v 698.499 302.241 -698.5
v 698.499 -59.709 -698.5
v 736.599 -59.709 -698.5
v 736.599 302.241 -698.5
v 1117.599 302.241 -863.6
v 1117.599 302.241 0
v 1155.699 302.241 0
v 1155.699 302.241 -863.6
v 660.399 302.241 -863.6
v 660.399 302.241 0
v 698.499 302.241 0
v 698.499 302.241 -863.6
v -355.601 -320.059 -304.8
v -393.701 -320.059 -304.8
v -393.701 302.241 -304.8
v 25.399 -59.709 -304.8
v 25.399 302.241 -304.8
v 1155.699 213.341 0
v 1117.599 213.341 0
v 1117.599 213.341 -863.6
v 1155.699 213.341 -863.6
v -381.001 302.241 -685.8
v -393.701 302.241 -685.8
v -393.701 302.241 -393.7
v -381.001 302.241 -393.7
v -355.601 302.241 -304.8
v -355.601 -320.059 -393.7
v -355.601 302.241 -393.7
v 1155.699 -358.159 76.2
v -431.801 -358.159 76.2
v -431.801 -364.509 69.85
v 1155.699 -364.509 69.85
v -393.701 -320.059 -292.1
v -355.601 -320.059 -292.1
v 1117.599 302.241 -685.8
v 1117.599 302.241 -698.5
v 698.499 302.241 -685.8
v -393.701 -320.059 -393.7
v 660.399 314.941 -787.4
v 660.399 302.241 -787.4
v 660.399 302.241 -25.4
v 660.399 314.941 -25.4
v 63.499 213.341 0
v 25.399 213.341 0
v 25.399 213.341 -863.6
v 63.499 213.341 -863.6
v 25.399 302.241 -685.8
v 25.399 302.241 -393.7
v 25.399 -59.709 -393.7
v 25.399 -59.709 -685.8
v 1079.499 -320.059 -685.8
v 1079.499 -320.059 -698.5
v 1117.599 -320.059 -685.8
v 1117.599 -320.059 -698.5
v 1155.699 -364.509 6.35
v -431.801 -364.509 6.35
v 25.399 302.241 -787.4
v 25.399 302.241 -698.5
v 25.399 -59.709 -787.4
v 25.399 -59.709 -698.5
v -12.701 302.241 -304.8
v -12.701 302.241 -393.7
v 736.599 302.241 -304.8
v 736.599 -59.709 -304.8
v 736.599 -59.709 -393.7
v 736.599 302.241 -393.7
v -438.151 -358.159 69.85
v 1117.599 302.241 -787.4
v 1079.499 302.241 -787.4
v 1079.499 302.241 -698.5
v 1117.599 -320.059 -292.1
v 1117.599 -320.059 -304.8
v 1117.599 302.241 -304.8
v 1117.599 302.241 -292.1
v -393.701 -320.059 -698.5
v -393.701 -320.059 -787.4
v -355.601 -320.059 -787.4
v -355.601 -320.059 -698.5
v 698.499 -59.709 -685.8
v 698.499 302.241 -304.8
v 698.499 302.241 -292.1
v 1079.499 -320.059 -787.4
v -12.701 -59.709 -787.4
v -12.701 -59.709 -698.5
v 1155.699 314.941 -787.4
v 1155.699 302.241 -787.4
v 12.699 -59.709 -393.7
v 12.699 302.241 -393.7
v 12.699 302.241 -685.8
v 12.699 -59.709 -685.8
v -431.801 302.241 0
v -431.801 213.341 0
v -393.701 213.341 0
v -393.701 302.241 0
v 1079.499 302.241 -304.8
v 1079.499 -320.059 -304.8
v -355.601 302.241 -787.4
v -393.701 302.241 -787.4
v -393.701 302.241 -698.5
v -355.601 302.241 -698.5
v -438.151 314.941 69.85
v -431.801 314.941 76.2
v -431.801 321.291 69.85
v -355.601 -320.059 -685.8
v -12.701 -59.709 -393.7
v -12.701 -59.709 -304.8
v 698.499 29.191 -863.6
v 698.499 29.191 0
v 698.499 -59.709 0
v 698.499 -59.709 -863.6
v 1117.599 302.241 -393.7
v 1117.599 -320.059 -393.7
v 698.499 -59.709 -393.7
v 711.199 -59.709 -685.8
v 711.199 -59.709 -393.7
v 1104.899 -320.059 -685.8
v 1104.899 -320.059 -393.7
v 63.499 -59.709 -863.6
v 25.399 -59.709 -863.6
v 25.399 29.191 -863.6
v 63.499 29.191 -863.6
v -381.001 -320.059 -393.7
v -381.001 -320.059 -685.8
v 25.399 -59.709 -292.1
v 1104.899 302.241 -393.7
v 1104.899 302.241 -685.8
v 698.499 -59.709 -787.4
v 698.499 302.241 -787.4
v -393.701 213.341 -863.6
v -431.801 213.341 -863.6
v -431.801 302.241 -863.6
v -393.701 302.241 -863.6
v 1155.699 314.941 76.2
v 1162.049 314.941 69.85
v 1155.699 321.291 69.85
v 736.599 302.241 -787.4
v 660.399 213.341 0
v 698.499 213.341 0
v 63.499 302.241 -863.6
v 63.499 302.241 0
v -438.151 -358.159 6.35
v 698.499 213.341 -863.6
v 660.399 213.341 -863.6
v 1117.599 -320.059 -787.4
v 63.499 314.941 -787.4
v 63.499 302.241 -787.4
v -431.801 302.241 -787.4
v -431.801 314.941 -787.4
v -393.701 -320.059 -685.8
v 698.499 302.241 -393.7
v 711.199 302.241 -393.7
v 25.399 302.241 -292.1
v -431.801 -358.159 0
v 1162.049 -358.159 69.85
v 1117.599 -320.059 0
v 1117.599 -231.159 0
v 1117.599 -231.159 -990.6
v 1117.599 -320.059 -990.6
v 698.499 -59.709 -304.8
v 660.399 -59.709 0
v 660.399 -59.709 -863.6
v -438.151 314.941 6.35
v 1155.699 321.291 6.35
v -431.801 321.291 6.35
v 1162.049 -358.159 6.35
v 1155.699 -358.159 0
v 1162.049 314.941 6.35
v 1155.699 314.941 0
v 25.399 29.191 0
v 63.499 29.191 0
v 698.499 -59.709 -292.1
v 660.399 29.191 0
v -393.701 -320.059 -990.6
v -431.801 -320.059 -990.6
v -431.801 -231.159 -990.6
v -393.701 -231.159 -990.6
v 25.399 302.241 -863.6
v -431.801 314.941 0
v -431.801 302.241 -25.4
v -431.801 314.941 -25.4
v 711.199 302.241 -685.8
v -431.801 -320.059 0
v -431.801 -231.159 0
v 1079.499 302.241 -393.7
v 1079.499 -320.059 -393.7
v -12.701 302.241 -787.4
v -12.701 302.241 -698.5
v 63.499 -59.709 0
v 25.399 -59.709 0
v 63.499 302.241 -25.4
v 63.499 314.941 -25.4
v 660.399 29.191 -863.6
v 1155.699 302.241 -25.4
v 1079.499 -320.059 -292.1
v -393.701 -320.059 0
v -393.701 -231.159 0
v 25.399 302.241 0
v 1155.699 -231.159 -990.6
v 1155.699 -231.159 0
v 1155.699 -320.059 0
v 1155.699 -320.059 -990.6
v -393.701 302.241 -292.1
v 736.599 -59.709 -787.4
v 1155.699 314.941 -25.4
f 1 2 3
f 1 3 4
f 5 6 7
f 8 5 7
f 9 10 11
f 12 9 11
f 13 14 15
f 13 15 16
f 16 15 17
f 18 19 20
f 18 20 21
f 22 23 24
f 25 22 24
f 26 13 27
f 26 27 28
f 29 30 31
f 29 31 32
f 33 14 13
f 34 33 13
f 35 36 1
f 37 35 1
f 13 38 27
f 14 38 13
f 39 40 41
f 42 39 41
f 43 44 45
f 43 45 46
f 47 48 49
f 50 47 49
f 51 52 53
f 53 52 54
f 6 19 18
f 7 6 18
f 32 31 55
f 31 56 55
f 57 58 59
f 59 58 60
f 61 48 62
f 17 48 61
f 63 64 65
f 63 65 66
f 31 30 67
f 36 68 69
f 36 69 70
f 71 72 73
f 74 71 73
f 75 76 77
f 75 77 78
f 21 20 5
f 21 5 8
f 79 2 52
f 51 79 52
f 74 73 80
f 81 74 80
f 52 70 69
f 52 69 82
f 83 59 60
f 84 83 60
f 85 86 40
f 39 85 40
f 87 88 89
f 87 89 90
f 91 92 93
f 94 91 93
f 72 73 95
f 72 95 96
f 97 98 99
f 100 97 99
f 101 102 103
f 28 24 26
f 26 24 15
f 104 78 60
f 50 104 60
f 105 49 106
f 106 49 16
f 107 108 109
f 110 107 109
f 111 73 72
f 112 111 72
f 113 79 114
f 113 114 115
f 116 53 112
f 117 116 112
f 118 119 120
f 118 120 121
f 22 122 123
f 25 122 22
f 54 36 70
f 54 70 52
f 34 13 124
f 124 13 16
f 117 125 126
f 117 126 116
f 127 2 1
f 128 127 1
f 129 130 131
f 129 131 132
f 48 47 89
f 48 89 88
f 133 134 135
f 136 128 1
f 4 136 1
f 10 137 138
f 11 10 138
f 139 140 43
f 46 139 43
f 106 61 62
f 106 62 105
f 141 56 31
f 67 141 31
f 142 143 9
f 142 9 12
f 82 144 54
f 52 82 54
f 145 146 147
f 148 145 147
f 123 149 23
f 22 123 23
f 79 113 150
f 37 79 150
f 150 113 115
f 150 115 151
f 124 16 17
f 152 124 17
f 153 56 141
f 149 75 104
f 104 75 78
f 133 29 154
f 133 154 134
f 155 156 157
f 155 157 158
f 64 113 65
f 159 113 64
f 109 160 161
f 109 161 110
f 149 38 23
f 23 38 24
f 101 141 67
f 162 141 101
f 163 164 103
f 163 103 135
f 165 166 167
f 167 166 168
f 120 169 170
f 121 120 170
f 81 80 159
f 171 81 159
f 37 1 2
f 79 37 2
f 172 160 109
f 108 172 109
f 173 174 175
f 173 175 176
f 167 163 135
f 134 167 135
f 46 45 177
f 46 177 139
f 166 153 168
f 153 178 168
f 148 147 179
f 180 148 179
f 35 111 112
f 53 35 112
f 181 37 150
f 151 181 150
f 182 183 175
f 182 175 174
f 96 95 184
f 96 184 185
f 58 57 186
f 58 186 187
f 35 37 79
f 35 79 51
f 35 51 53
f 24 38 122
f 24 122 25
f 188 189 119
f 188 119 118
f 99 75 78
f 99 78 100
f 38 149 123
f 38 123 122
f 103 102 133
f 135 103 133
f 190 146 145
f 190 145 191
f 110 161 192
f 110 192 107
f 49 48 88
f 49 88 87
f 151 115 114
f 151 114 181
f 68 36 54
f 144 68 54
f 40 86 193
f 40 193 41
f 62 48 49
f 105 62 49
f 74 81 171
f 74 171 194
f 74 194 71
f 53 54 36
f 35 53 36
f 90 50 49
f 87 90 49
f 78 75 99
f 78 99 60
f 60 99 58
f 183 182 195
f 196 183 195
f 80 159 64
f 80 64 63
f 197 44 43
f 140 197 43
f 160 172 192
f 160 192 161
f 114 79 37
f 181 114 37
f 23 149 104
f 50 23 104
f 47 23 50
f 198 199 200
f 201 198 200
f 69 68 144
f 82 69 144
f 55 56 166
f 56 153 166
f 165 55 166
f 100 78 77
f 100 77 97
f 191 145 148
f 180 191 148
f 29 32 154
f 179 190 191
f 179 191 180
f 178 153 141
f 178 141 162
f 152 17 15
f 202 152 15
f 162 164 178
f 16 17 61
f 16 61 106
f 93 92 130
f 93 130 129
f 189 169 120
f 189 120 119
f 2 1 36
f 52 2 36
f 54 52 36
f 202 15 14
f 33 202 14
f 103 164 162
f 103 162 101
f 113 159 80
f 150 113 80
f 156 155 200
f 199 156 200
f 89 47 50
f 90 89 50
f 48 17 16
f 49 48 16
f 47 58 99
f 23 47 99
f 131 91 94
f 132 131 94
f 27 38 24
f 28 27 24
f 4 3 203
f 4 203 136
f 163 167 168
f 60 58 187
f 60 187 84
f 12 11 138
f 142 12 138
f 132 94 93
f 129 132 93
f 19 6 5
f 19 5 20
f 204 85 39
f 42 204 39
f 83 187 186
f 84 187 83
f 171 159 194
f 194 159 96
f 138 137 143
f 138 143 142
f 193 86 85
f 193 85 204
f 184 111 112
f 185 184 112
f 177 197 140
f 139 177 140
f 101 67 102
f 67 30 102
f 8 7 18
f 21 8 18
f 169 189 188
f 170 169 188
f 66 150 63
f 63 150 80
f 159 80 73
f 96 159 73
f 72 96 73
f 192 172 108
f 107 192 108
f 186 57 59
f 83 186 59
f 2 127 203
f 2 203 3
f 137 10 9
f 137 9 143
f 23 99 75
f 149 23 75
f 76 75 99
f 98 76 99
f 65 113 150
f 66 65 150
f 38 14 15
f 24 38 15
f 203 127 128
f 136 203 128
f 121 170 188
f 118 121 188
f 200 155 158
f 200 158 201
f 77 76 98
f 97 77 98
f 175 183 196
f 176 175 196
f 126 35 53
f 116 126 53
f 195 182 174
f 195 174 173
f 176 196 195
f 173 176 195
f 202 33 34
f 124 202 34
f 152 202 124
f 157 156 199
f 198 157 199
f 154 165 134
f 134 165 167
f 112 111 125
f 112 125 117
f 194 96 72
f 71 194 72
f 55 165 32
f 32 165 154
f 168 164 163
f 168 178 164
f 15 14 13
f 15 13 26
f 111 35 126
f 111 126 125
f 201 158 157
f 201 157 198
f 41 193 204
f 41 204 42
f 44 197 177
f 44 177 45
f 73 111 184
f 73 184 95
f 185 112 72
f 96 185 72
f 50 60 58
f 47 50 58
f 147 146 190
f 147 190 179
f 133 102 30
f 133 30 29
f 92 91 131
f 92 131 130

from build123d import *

# Parameters (mm, degrees)
F0_W      = 1600.2
F0_H      = 685.8
F1_DEPTH  = 76.2
F2_SIZE   = 6.35
F3_W      = 38.1
F3_H      = 88.9
F4_DEPTH  = 990.6
F4_FACE_W = 38.1
F4_FACE_H = 88.9
F5_DEPTH  = 127
F6_W      = 622.3
F6_H      = 88.9
F7_DEPTH  = 38.1
F8_W      = 361.95
F8_H      = 88.9
F9_DEPTH  = 38.1
F10_W     = 361.95
F10_H     = 88.9
F11_DEPTH = 38.1
F12_W     = 622.3
F12_H     = 88.9
F13_DEPTH = 38.1
F15_DEPTH = 12.7
F17_DEPTH = 12.7
F19_DEPTH = 12.7
F21_DEPTH = 12.7
F22_W     = 495.3
F22_H     = 762
F23_DEPTH = 12.7
F24_W     = 495.3
F24_H     = 762
F25_DEPTH = 12.7
F26_W     = 622.3
F26_H     = 292.1
F27_DEPTH = 12.7
F28_W     = 361.95
F28_H     = 292.1
F29_DEPTH = 12.7
F30_W     = 361.95
F30_H     = 292.1
F31_DEPTH = 12.7
F32_W     = 622.3
F32_H     = 292.1
F33_DEPTH = 12.7


with BuildPart() as f1:
    # F0 (on Top) → F1 (new body)
    with BuildSketch(Plane.XY):
        with Locations((361.94872, -21.608793)):
            Rectangle(F0_W, F0_H)
    extrude(amount=F1_DEPTH)

    # F2
    f2_edges = [f1.edges().sort_by_distance(p)[0] for p in [
        (-438.15128, -21.608793, 76.2),
        (361.94872, -364.508793, 76.2),
        (361.94872, -364.508793, 0),
        (-438.15128, -364.508793, 38.1),
        (1162.04872, -364.508793, 38.1),
        (1162.04872, -21.608793, 76.2),
        (1162.04872, -21.608793, 0),
        (1162.04872, 321.291207, 38.1),
        (361.94872, 321.291207, 76.2),
        (361.94872, 321.291207, 0),
        (-438.15128, 321.291207, 38.1),
        (-438.15128, -21.608793, 0),
    ]]
    chamfer(f2_edges, length=F2_SIZE)


with BuildPart() as f4:
    # F3 (on face) → F4 (new body)
    with BuildSketch(Plane(origin=(0, 0, 0), x_dir=(1, 0, 0), z_dir=(0, 0, -1))):
        with Locations((-412.75128, -257.791207)):
            Rectangle(F3_W, F3_H)
        with Locations((-412.75128, 275.608793)):
            Rectangle(F3_W, F3_H)
        with Locations((44.44872, 15.258793)):
            Rectangle(F3_W, F3_H)
        with Locations((44.44872, -257.791207)):
            Rectangle(F3_W, F3_H)
        with Locations((679.44872, -257.791207)):
            Rectangle(F3_W, F3_H)
        with Locations((679.44872, 15.258793)):
            Rectangle(F3_W, F3_H)
        with Locations((1136.64872, 275.608793)):
            Rectangle(F3_W, F3_H)
        with Locations((1136.64872, -257.791207)):
            Rectangle(F3_W, F3_H)
    extrude(amount=F4_DEPTH)

    # F4_face (on face) → F5 (cut)
    with BuildSketch(Plane(origin=(-412.75128, 257.791207, -990.6), x_dir=(1, 0, 0), z_dir=(0, 0, -1))):
        Rectangle(F4_FACE_W, F4_FACE_H)
        with Locations((457.2, 0)):
            Rectangle(F4_FACE_W, F4_FACE_H)
        with Locations((457.2, 273.05)):
            Rectangle(F4_FACE_W, F4_FACE_H)
        with Locations((1092.2, 273.05)):
            Rectangle(F4_FACE_W, F4_FACE_H)
        with Locations((1092.2, 0)):
            Rectangle(F4_FACE_W, F4_FACE_H)
        with Locations((1549.4, 0)):
            Rectangle(F4_FACE_W, F4_FACE_H)
    extrude(amount=-F5_DEPTH, mode=Mode.SUBTRACT)


with BuildPart() as f7:
    # F6 (on face) → F7 (new body)
    with BuildSketch(Plane.YZ.offset(-393.70128)):
        with Locations((-8.908793, -349.25)):
            Rectangle(F6_W, F6_H)
        with Locations((-8.908793, -742.95)):
            Rectangle(F6_W, F6_H)
    extrude(amount=F7_DEPTH)


with BuildPart() as f9:
    # F8 (on face) → F9 (new body)
    with BuildSketch(Plane(origin=(25.39872, 0, 0), x_dir=(0, -1, 0), z_dir=(-1, 0, 0))):
        with Locations((-121.266207, -349.25)):
            Rectangle(F8_W, F8_H)
        with Locations((-121.266207, -742.95)):
            Rectangle(F8_W, F8_H)
    extrude(amount=F9_DEPTH)


with BuildPart() as f11:
    # F10 (on face) → F11 (new body)
    with BuildSketch(Plane.YZ.offset(698.49872)):
        with Locations((121.266207, -349.25)):
            Rectangle(F10_W, F10_H)
        with Locations((121.266207, -742.95)):
            Rectangle(F10_W, F10_H)
    extrude(amount=F11_DEPTH)


with BuildPart() as f13:
    # F12 (on face) → F13 (new body)
    with BuildSketch(Plane(origin=(1117.59872, 0, 0), x_dir=(0, -1, 0), z_dir=(-1, 0, 0))):
        with Locations((8.908793, -742.95)):
            Rectangle(F12_W, F12_H)
        with Locations((8.908793, -349.25)):
            Rectangle(F12_W, F12_H)
    extrude(amount=F13_DEPTH)


with BuildPart() as f15:
    # F14 (on face) → F15 (new body)
    with BuildSketch(Plane.XY.offset(-304.8)):
        Polygon((25.39872, -59.708793), (25.39872, 302.241207), (-393.70128, 302.241207), (-393.70128, -320.058793), (-355.60128, -320.058793), align=None)
    extrude(amount=F15_DEPTH)


with BuildPart() as f17:
    # F16 (on face) → F17 (new body)
    with BuildSketch(Plane.XY.offset(-698.5)):
        Polygon((25.39872, -59.708793), (25.39872, 302.241207), (-393.70128, 302.241207), (-393.70128, -320.058793), (-355.60128, -320.058793), align=None)
    extrude(amount=F17_DEPTH)


with BuildPart() as f19:
    # F18 (on face) → F19 (new body)
    with BuildSketch(Plane.XY.offset(-304.8)):
        Polygon((1117.59872, 302.241207), (698.49872, 302.241207), (698.49872, -59.708793), (1079.49872, -320.058793), (1117.59872, -320.058793), align=None)
    extrude(amount=F19_DEPTH)


with BuildPart() as f21:
    # F20 (on face) → F21 (new body)
    with BuildSketch(Plane.XY.offset(-698.5)):
        Polygon((1117.59872, 302.241207), (698.49872, 302.241207), (698.49872, -59.708793), (1079.49872, -320.058793), (1117.59872, -320.058793), align=None)
    extrude(amount=F21_DEPTH)


with BuildPart() as f23:
    # F22 (on face) → F23 (new body)
    with BuildSketch(Plane(origin=(0, 302.241207, 0), x_dir=(-1, 0, 0), z_dir=(0, 1, 0))):
        with Locations((-908.04872, -406.4)):
            Rectangle(F22_W, F22_H)
    extrude(amount=F23_DEPTH)


with BuildPart() as f25:
    # F24 (on face) → F25 (new body)
    with BuildSketch(Plane(origin=(0, 302.241207, 0), x_dir=(-1, 0, 0), z_dir=(0, 1, 0))):
        with Locations((184.15128, -406.4)):
            Rectangle(F24_W, F24_H)
    extrude(amount=F25_DEPTH)


with BuildPart() as f27:
    # F26 (on face) → F27 (new body)
    with BuildSketch(Plane.YZ.offset(-393.70128)):
        with Locations((-8.908793, -539.75)):
            Rectangle(F26_W, F26_H)
    extrude(amount=F27_DEPTH)


with BuildPart() as f29:
    # F28 (on face) → F29 (new body)
    with BuildSketch(Plane(origin=(25.39872, 0, 0), x_dir=(0, -1, 0), z_dir=(-1, 0, 0))):
        with Locations((-121.266207, -539.75)):
            Rectangle(F28_W, F28_H)
    extrude(amount=F29_DEPTH)


with BuildPart() as f31:
    # F30 (on face) → F31 (new body)
    with BuildSketch(Plane.YZ.offset(698.49872)):
        with Locations((121.266207, -539.75)):
            Rectangle(F30_W, F30_H)
    extrude(amount=F31_DEPTH)


with BuildPart() as f33:
    # F32 (on face) → F33 (new body)
    with BuildSketch(Plane(origin=(1117.59872, 0, 0), x_dir=(0, -1, 0), z_dir=(-1, 0, 0))):
        with Locations((8.908793, -539.75)):
            Rectangle(F32_W, F32_H)
    extrude(amount=F33_DEPTH)


solid = Compound([f1.part, f4.part, f7.part, f9.part, f11.part, f13.part, f15.part, f17.part, f19.part, f21.part, f23.part, f25.part, f27.part, f29.part, f31.part, f33.part])
